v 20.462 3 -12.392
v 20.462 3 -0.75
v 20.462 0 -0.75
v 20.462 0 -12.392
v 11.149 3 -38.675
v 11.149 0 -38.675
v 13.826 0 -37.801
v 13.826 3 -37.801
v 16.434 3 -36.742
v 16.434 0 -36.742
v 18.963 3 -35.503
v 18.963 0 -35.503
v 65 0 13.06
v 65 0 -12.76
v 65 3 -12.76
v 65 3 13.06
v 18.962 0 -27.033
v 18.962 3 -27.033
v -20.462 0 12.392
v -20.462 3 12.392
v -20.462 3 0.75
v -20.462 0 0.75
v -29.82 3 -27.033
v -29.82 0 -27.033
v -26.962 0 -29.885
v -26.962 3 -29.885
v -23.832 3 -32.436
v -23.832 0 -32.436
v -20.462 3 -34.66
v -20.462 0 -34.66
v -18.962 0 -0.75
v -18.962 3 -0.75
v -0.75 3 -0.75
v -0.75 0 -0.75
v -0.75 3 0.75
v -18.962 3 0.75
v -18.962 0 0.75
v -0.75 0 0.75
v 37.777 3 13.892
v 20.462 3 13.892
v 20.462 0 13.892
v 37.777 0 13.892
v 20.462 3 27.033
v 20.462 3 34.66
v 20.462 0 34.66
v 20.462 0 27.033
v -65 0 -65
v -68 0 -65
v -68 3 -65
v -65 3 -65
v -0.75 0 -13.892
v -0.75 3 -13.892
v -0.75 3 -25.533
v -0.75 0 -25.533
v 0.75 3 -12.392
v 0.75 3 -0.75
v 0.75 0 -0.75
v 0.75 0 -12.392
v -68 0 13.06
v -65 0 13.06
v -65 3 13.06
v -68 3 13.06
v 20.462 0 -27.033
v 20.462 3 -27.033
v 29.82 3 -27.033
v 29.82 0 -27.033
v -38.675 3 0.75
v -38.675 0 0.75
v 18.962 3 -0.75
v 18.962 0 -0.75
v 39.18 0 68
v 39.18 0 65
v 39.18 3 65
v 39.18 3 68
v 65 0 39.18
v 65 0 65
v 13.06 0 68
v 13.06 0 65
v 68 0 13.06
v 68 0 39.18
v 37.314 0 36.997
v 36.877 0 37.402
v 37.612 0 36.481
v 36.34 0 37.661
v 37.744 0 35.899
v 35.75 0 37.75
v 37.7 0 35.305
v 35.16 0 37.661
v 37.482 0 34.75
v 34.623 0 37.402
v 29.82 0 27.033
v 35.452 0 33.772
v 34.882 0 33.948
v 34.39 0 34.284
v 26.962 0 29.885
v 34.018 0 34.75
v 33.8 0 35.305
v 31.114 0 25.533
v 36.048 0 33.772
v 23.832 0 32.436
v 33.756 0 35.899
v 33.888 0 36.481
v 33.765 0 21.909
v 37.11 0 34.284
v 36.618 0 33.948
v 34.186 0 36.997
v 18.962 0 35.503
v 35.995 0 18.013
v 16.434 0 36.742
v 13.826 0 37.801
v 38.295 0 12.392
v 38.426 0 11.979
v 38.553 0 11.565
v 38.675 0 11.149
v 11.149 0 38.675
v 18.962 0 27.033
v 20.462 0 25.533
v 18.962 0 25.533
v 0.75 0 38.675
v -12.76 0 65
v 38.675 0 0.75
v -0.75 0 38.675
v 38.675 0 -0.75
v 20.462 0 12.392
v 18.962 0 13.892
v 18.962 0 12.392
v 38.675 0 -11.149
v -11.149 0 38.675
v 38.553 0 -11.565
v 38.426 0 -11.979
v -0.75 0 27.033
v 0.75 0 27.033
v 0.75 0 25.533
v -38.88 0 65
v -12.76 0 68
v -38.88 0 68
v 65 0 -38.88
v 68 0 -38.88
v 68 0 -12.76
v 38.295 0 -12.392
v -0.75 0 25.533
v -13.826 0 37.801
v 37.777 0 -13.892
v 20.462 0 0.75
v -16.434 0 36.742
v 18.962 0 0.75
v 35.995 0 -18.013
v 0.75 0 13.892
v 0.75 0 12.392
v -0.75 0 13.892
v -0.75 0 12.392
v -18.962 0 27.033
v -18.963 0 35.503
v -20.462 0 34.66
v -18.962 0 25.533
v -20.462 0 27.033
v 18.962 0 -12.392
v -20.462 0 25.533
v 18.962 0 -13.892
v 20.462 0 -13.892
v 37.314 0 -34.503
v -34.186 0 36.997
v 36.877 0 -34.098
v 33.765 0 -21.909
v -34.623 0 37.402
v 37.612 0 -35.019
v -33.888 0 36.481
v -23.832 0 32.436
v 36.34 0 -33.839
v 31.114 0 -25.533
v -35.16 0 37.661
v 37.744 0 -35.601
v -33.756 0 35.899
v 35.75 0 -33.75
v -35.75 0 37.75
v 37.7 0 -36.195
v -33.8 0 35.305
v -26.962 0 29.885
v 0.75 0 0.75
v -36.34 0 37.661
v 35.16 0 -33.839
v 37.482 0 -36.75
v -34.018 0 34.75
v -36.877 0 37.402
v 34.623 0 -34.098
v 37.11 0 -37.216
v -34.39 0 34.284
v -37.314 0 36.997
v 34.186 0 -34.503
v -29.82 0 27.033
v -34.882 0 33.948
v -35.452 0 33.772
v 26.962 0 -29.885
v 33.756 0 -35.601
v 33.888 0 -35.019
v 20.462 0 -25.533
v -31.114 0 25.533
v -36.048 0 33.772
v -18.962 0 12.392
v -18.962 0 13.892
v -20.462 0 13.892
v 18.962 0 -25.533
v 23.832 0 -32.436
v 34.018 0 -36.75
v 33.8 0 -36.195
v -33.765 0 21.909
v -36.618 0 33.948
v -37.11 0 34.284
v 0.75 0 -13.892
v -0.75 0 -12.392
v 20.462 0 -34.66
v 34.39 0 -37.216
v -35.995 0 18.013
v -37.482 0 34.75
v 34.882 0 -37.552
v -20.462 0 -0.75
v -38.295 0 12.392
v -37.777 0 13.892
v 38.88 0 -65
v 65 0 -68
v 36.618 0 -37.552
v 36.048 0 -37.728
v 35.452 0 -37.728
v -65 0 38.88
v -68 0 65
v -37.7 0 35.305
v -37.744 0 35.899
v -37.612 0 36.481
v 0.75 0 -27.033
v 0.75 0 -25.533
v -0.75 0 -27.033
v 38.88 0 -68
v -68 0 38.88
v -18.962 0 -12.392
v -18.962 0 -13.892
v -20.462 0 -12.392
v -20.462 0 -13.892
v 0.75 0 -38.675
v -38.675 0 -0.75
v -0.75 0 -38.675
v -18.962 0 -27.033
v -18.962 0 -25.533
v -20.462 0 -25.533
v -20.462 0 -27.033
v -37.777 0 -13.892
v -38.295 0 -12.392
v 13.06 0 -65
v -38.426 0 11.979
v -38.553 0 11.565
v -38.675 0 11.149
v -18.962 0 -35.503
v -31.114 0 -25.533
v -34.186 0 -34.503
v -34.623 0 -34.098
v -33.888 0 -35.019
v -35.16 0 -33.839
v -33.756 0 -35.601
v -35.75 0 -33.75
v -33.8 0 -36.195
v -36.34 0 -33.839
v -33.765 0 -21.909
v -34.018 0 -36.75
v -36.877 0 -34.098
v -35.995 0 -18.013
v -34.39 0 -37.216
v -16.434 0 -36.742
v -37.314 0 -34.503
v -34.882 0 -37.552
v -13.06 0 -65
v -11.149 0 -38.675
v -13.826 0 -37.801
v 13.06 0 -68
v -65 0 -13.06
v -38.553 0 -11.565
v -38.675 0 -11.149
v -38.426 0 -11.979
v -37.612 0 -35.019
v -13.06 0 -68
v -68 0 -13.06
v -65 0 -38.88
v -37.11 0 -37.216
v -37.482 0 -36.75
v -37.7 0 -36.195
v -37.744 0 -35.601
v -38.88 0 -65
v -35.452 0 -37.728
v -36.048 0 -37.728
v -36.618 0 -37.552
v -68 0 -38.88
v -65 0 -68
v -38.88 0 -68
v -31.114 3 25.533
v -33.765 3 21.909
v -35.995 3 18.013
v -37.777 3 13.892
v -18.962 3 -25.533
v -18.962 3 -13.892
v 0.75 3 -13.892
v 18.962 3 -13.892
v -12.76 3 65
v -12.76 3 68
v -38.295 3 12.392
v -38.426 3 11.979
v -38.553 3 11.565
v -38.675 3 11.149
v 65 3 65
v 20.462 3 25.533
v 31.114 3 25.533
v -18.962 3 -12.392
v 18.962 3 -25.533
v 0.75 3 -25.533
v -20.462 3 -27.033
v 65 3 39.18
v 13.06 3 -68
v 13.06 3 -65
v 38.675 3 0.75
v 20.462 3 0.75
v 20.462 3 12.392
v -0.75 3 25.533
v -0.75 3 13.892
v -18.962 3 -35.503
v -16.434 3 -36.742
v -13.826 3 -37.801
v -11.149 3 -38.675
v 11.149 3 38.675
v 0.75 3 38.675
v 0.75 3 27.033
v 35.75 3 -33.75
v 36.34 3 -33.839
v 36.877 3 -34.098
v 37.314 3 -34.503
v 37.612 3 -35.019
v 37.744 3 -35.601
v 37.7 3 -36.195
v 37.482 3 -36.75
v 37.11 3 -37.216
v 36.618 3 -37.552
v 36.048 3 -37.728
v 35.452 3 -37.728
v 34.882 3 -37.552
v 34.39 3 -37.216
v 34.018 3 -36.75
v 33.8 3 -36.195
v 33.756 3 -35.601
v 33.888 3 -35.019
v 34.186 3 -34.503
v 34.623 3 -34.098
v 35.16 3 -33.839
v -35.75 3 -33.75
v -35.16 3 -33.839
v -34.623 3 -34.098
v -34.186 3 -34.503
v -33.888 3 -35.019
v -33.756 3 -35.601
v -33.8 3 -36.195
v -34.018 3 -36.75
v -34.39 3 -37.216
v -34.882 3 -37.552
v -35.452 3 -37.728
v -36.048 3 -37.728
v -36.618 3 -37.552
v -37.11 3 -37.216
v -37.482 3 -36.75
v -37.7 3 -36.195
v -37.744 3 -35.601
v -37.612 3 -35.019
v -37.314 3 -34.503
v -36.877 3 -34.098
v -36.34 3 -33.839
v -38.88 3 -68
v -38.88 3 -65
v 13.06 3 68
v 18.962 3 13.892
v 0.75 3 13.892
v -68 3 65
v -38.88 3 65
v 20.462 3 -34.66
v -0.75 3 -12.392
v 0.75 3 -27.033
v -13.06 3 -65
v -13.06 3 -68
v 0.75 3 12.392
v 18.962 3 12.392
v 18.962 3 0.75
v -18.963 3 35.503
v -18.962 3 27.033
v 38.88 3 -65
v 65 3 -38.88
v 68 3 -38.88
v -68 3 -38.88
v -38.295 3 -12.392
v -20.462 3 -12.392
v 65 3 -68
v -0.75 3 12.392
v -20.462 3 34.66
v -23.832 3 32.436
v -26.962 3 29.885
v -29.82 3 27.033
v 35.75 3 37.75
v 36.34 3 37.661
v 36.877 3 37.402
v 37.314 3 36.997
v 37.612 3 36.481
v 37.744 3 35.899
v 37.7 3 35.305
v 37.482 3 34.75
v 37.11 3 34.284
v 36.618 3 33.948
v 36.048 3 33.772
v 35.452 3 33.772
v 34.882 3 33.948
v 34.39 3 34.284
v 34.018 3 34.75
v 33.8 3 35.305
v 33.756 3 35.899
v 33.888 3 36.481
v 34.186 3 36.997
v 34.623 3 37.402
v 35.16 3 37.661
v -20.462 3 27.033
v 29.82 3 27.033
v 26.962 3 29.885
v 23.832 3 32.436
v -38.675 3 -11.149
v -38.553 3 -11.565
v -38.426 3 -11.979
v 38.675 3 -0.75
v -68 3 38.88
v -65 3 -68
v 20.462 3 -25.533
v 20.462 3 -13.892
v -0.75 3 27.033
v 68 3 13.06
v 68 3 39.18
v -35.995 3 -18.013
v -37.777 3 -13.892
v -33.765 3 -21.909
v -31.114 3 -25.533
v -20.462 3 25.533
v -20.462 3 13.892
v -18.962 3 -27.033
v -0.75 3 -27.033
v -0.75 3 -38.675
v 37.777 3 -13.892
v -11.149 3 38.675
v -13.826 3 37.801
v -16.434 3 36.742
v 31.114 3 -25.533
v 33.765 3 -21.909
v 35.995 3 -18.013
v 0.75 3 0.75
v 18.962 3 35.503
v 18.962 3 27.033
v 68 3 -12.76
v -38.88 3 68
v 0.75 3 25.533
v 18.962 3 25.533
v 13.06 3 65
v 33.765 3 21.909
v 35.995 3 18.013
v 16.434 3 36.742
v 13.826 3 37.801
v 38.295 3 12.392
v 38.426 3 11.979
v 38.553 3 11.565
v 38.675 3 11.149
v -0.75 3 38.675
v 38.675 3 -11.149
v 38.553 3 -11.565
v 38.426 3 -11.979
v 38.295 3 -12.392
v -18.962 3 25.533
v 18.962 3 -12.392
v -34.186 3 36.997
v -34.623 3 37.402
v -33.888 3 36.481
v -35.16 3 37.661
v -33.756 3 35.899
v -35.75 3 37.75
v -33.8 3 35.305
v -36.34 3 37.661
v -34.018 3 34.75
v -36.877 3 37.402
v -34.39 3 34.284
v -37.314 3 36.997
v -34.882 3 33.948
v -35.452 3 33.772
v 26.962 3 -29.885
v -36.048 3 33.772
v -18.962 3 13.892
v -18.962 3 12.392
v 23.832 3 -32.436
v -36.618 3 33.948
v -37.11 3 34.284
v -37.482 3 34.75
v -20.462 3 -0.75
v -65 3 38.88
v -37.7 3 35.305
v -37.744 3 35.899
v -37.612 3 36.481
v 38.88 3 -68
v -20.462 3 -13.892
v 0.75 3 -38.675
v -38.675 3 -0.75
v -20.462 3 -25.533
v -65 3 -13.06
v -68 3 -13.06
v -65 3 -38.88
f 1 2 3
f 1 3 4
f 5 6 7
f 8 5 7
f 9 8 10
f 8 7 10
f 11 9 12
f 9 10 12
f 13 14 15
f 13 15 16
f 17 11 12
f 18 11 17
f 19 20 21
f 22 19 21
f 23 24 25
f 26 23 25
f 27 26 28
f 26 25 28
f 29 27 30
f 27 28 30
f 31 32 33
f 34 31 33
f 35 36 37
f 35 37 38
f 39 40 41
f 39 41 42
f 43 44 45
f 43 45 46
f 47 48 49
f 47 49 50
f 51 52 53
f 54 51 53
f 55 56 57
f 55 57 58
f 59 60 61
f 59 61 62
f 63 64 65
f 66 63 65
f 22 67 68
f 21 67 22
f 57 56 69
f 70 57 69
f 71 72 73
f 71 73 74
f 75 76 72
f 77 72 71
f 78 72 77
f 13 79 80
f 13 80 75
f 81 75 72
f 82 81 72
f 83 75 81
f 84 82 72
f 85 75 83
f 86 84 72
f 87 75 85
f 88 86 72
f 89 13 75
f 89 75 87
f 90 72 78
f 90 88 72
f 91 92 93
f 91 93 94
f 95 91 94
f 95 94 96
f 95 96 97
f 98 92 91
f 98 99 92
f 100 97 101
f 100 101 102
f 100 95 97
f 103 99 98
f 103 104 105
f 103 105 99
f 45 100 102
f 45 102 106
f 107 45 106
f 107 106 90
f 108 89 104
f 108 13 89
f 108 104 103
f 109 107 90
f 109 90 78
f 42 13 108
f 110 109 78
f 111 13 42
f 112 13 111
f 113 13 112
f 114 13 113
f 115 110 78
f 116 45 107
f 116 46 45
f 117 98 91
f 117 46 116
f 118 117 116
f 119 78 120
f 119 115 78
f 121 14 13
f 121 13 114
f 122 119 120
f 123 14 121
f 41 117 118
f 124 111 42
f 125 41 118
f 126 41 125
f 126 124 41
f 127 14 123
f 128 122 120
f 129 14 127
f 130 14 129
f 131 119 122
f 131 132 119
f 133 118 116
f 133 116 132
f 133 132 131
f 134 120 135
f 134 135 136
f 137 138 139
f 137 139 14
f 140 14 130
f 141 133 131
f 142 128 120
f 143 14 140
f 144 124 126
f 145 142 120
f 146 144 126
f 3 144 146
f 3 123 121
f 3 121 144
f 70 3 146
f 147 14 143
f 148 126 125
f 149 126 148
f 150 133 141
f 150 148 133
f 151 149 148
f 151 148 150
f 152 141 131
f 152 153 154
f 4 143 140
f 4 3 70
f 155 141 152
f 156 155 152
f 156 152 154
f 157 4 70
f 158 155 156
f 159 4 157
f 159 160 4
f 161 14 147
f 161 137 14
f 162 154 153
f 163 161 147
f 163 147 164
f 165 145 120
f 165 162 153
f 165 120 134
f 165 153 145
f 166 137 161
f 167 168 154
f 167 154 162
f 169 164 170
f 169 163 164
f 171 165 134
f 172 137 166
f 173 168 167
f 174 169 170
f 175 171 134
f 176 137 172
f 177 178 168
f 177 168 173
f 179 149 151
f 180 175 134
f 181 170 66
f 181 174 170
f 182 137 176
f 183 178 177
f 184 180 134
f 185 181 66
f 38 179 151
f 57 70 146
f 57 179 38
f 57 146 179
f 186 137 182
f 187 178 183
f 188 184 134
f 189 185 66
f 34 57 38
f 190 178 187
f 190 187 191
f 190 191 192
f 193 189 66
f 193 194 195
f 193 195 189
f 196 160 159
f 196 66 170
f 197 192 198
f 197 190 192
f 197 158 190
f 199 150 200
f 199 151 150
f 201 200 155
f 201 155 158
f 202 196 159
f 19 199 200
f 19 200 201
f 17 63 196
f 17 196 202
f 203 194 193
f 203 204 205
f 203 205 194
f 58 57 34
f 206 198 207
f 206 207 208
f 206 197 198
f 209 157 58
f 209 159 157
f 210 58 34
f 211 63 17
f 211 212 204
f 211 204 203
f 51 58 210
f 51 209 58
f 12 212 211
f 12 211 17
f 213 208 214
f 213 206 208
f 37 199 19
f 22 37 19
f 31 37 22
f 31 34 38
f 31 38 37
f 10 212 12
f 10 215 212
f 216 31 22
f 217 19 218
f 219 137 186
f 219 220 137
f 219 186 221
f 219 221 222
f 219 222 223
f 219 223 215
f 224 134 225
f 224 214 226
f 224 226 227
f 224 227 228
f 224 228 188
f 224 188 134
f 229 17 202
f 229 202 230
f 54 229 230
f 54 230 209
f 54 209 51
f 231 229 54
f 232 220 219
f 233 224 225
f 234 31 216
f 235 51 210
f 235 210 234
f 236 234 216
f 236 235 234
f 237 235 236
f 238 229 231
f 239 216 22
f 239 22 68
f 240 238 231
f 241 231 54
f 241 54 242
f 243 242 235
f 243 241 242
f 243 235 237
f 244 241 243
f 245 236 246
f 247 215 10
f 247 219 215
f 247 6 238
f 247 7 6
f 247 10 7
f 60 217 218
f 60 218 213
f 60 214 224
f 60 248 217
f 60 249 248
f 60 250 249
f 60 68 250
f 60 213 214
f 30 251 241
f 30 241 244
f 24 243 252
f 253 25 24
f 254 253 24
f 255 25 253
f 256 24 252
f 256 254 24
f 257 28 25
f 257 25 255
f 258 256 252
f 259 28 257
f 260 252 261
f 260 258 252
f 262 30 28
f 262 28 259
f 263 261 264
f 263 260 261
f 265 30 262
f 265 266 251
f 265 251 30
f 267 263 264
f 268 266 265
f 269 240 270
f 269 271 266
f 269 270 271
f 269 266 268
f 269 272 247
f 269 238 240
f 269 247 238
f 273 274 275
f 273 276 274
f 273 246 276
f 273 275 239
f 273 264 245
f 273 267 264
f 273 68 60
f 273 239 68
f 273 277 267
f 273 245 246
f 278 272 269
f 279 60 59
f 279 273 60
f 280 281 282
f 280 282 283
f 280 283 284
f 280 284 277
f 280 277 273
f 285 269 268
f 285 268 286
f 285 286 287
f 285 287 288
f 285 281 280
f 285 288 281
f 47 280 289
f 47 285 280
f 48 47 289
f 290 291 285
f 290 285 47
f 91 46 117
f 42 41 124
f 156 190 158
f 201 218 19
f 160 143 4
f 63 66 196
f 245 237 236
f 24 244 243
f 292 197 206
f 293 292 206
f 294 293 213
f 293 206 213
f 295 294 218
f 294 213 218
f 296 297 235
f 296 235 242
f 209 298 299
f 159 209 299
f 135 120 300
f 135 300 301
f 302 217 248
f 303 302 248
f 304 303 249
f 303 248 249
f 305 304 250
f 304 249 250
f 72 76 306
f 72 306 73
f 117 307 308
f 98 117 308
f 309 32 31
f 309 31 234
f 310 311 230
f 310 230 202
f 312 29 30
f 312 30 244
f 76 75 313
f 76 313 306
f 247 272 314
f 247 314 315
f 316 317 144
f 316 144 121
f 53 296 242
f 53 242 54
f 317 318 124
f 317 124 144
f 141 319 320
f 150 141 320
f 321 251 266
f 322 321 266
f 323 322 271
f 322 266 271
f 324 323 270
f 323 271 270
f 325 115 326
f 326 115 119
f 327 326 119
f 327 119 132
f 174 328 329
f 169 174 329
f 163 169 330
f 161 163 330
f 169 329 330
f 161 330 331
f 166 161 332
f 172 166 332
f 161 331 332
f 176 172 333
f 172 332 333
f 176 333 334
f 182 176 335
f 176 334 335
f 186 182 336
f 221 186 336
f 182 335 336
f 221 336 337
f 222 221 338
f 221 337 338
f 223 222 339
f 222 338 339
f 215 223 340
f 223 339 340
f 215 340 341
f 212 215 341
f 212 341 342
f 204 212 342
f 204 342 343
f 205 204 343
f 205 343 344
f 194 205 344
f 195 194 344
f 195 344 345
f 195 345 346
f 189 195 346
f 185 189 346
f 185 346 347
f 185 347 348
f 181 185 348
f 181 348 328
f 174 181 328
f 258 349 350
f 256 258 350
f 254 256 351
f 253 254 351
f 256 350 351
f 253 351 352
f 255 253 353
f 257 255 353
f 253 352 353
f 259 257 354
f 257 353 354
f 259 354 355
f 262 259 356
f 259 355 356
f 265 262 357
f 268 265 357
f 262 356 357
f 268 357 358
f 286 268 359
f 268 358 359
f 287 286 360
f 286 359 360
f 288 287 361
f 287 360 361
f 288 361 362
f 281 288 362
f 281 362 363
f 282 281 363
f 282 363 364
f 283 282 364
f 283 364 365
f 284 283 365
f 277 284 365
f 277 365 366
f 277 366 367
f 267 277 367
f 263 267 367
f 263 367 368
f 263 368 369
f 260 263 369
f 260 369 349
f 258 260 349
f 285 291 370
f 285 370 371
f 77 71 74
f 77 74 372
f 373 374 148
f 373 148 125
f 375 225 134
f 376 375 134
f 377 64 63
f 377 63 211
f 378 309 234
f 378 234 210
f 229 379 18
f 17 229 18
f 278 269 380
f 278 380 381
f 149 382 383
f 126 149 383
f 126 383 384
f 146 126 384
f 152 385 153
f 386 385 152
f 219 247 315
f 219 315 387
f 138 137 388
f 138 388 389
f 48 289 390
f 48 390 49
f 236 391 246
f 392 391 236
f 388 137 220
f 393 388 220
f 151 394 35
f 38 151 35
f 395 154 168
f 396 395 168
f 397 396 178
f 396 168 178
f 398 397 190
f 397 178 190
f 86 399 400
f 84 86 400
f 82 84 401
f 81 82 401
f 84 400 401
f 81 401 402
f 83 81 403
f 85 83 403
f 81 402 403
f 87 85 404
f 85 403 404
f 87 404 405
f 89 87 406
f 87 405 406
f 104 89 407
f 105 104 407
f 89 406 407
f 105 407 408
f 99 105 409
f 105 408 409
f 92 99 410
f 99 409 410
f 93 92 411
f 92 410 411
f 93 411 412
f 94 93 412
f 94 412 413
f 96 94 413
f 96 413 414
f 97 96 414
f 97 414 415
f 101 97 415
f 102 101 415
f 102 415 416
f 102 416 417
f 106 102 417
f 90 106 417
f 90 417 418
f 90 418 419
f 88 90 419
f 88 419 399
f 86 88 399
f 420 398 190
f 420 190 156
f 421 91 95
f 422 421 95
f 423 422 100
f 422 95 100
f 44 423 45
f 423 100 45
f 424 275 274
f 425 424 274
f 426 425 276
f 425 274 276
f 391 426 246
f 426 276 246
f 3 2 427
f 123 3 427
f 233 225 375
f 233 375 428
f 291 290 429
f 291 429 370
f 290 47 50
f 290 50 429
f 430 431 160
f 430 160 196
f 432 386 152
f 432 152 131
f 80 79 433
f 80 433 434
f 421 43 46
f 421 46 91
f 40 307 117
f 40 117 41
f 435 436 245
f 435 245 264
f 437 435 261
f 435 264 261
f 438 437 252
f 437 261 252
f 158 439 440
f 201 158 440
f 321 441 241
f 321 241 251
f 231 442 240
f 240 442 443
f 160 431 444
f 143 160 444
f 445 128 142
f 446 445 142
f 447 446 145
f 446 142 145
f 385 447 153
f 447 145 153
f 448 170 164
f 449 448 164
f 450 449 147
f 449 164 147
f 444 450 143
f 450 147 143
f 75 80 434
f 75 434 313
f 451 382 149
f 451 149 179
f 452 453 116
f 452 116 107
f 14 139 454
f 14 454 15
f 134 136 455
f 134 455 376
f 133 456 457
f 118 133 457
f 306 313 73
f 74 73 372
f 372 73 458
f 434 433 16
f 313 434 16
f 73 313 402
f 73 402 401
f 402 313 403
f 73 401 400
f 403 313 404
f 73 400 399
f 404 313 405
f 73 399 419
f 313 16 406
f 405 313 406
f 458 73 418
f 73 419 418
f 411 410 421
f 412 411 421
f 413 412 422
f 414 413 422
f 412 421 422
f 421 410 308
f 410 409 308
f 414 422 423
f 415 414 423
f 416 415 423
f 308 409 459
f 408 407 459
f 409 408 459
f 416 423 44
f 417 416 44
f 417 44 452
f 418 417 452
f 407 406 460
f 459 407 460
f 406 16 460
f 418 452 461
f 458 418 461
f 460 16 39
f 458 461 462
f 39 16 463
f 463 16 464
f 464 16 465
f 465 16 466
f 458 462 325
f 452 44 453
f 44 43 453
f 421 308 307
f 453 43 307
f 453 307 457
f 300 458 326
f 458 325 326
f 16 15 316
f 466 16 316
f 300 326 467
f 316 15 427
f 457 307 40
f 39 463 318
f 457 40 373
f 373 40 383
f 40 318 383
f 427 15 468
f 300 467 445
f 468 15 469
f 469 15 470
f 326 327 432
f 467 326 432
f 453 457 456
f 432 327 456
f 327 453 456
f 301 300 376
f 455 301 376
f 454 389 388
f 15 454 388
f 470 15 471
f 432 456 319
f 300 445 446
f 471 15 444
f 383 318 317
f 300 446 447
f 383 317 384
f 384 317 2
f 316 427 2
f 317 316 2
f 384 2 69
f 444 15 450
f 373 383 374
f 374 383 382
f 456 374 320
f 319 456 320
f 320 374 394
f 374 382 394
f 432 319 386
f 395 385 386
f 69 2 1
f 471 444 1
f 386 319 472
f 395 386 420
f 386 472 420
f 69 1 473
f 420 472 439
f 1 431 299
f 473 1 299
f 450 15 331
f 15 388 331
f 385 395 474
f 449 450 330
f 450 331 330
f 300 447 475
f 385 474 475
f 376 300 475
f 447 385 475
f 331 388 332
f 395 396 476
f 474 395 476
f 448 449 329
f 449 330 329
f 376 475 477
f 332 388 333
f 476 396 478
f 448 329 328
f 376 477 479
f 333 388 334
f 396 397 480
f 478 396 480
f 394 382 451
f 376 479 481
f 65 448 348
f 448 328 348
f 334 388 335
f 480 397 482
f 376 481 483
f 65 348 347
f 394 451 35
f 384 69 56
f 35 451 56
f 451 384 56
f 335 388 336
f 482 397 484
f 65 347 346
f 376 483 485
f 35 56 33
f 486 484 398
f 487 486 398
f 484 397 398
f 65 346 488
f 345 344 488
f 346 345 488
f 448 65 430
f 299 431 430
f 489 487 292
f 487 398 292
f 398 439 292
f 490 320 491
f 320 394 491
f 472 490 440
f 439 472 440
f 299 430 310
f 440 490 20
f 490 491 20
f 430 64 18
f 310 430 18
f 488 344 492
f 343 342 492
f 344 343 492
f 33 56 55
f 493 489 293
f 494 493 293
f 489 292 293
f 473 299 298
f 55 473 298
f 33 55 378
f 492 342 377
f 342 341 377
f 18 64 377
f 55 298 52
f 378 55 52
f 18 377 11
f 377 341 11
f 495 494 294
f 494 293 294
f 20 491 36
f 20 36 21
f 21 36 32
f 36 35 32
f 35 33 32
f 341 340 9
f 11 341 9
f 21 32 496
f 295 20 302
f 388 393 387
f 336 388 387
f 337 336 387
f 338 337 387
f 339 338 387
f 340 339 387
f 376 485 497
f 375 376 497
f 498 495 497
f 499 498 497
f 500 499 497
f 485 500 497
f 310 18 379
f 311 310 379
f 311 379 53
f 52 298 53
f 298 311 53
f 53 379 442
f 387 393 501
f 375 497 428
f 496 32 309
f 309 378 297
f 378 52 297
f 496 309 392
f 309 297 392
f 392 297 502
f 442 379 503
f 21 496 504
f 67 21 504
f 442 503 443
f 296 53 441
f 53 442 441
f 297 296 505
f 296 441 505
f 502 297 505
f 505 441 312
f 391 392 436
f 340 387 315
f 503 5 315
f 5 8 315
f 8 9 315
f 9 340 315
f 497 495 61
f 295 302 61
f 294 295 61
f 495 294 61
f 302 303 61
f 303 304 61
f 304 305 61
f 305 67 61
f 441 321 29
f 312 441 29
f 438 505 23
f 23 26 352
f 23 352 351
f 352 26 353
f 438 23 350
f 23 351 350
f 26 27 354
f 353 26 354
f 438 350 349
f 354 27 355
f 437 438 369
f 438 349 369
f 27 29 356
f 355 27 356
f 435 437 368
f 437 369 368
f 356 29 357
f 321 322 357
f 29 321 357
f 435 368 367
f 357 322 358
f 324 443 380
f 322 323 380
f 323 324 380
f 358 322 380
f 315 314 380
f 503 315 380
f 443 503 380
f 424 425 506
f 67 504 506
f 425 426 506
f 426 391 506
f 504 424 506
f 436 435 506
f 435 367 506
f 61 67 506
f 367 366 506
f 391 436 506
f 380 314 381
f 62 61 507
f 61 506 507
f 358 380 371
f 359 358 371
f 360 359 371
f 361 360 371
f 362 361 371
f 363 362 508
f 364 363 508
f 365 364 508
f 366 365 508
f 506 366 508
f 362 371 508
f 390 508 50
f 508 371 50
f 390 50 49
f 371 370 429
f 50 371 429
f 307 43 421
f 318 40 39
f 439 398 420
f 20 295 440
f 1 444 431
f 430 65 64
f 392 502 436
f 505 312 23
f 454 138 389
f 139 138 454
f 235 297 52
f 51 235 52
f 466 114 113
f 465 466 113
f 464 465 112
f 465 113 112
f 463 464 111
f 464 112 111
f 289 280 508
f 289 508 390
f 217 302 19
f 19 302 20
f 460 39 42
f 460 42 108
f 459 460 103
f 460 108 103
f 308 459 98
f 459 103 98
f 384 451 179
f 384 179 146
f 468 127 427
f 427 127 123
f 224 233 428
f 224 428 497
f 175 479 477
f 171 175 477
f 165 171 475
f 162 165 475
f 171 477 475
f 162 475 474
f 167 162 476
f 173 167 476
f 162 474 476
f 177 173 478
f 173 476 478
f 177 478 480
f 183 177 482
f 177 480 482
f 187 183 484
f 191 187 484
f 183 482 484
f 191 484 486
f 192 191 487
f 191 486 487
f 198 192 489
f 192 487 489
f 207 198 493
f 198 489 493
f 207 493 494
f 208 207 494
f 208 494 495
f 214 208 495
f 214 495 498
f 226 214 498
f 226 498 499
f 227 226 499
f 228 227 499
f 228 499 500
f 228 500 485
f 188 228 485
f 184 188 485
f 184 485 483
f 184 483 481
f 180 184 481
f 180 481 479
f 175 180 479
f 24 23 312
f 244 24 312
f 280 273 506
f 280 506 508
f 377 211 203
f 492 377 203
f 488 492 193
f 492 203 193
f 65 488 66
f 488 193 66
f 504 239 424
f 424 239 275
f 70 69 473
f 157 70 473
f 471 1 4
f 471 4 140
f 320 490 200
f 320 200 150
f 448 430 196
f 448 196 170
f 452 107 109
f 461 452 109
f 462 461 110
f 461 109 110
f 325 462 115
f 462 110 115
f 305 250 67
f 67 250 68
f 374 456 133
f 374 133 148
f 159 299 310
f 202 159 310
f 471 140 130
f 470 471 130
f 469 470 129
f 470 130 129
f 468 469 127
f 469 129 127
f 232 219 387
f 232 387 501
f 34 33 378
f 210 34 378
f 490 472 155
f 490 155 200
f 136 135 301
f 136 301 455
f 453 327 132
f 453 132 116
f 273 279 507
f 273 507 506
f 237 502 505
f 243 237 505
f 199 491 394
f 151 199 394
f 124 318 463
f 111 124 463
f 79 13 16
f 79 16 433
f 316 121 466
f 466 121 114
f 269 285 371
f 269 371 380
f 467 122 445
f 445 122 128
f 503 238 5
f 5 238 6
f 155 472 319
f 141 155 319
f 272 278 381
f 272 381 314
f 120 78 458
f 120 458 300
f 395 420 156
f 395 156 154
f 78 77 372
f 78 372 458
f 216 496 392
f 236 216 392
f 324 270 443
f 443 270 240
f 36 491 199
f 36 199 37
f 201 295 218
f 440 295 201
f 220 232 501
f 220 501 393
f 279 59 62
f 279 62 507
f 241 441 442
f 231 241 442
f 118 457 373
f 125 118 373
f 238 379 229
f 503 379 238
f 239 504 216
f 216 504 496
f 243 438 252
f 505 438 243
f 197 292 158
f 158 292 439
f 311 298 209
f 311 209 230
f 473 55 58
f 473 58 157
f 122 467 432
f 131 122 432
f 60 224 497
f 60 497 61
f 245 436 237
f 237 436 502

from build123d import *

# Parameters (mm, degrees)
BOSS_EXTRUDE1_DEPTH = 3
SKETCH2_W           = 130
SKETCH2_H           = 1.5
BOSS_EXTRUDE2_DEPTH = 3
SKETCH3_W           = 1.5
SKETCH3_H           = 11.641666667
SKETCH3_H_2         = 11.641666666
BOSS_EXTRUDE3_DEPTH = 3
SKETCH4_R           = 2
CUT_EXTRUDE1_DEPTH  = 97.213304693


with BuildPart() as part:
    # Sketch1 → Boss-Extrude1 (new body)
    with BuildSketch(Plane(origin=(0, 0, 0), x_dir=(1, 0, 0), z_dir=(0, 1, 0))):
        Polygon((65, 38.88), (68, 38.88), (68, 12.76), (65, 12.76), (65, -13.06), (68, -13.06), (68, -39.18), (65, -39.18), (65, -65), (39.18, -65), (39.18, -68), (13.06, -68), (13.06, -65), (-12.76, -65), (-12.76, -68), (-38.88, -68), (-38.88, -65), (-64.7, -65), (-68, -65), (-68, -38.88), (-65, -38.88), (-65, -13.06), (-68, -13.06), (-68, 13.06), (-65, 13.06), (-65, 38.88), (-68, 38.88), (-68, 65), (-65, 65), (-65, 68), (-38.88, 68), (-38.88, 65), (-13.06, 65), (-13.06, 68), (13.06, 68), (13.06, 65), (38.88, 65), (38.88, 68), (65, 68), (65, 64.7), align=None)
        with BuildLine():
            Line((11.149299305, -38.675), (-11.149299305, -38.675))
            ThreePointArc((-11.149299305, -38.675), (-28.461047943, -28.461047943), (-38.675, -11.149299305))
            Line((-38.675, -11.149299305), (-38.675, 11.149299305))
            ThreePointArc((-38.675, 11.149299305), (-28.461047943, 28.461047943), (-11.149299305, 38.675))
            Line((-11.149299305, 38.675), (11.149299305, 38.675))
            ThreePointArc((11.149299305, 38.675), (28.461047943, 28.461047943), (38.675, 11.149299305))
            Line((38.675, 11.149299305), (38.675, -11.149299305))
            ThreePointArc((38.675, -11.149299305), (28.461047943, -28.461047943), (11.149299305, -38.675))
        make_face(mode=Mode.SUBTRACT)
    extrude(amount=BOSS_EXTRUDE1_DEPTH)

    # Sketch2 → Boss-Extrude2 (add, through all)
    with BuildSketch(Plane(origin=(0, 3, 0), x_dir=(1, 0, 0), z_dir=(0, 1, 0))):
        with Locations((0, 39.425)):
            Rectangle(SKETCH2_W, SKETCH2_H)
        with Locations((0, 26.283333333)):
            Rectangle(SKETCH2_W, SKETCH2_H)
        with Locations((0, 13.141666667)):
            Rectangle(SKETCH2_W, SKETCH2_H)
        Rectangle(SKETCH2_W, SKETCH2_H)
        with Locations((0, -13.141666667)):
            Rectangle(SKETCH2_W, SKETCH2_H)
        with Locations((0, -26.283333333)):
            Rectangle(SKETCH2_W, SKETCH2_H)
        with Locations((0, -39.425)):
            Rectangle(SKETCH2_W, SKETCH2_H)
    extrude(amount=-BOSS_EXTRUDE2_DEPTH)

    # Sketch3 → Boss-Extrude3 (add, through all)
    with BuildSketch(Plane(origin=(0, 3, 0), x_dir=(1, 0, 0), z_dir=(0, 1, 0))):
        with Locations((-19.7125, -6.570833334)):
            Rectangle(SKETCH3_W, SKETCH3_H)
        with Locations((-19.7125, 6.570833334)):
            Rectangle(SKETCH3_W, SKETCH3_H)
        with Locations((-19.7125, -19.7125)):
            Rectangle(SKETCH3_W, SKETCH3_H_2)
        with Locations((0, -6.570833334)):
            Rectangle(SKETCH3_W, SKETCH3_H)
        with Locations((-19.7125, 19.7125)):
            Rectangle(SKETCH3_W, SKETCH3_H_2)
        with Locations((0, 6.570833334)):
            Rectangle(SKETCH3_W, SKETCH3_H)
        with BuildLine():
            Line((-18.9625, -27.033333333), (-20.4625, -27.033333333))
            Line((-20.4625, -27.033333333), (-20.4625, -34.66047596))
            ThreePointArc((-20.4625, -34.66047596), (-19.717004208, -35.089916573), (-18.9625, -35.503325108))
            Line((-18.9625, -35.503325108), (-18.9625, -27.033333333))
        make_face()
        with Locations((0, -19.7125)):
            Rectangle(SKETCH3_W, SKETCH3_H_2)
        with Locations((19.7125, -6.570833334)):
            Rectangle(SKETCH3_W, SKETCH3_H)
        with BuildLine():
            Line((-20.4625, 34.66047596), (-20.4625, 27.033333333))
            Line((-20.4625, 27.033333333), (-18.9625, 27.033333333))
            Line((-18.9625, 27.033333333), (-18.9625, 35.503325108))
            ThreePointArc((-18.9625, 35.503325108), (-19.717004208, 35.089916573), (-20.4625, 34.66047596))
        make_face()
        with Locations((0, 19.7125)):
            Rectangle(SKETCH3_W, SKETCH3_H_2)
        with Locations((19.7125, 6.570833334)):
            Rectangle(SKETCH3_W, SKETCH3_H)
        with Locations((0, -32.854166667)):
            Rectangle(SKETCH3_W, SKETCH3_H)
        with Locations((19.7125, -19.7125)):
            Rectangle(SKETCH3_W, SKETCH3_H_2)
        with Locations((0, 32.854166667)):
            Rectangle(SKETCH3_W, SKETCH3_H)
        with Locations((19.7125, 19.7125)):
            Rectangle(SKETCH3_W, SKETCH3_H_2)
        with BuildLine():
            Line((20.4625, -27.033333333), (18.9625, -27.033333333))
            Line((18.9625, -27.033333333), (18.9625, -35.503325108))
            ThreePointArc((18.9625, -35.503325108), (19.717004208, -35.089916573), (20.4625, -34.66047596))
            Line((20.4625, -34.66047596), (20.4625, -27.033333333))
        make_face()
        with BuildLine():
            Line((18.9625, 35.503325108), (18.9625, 27.033333333))
            Line((18.9625, 27.033333333), (20.4625, 27.033333333))
            Line((20.4625, 27.033333333), (20.4625, 34.66047596))
            ThreePointArc((20.4625, 34.66047596), (19.717004208, 35.089916573), (18.9625, 35.503325108))
        make_face()
    extrude(amount=-BOSS_EXTRUDE3_DEPTH)

    # Sketch4 → Cut-Extrude1 (cut, through all)
    with BuildSketch(Plane(origin=(0, 3, 0), x_dir=(1, 0, 0), z_dir=(0, 1, 0))):
        with Locations(Location((-35.75, 35.75, 0), (0, 0, 270))):
            Circle(SKETCH4_R)
        with Locations(Location((35.75, 35.75, 0), (0, 0, 270))):
            Circle(SKETCH4_R)
        with Locations(Location((35.75, -35.75, 0), (0, 0, 270))):
            Circle(SKETCH4_R)
        with Locations(Location((-35.75, -35.75, 0), (0, 0, 270))):
            Circle(SKETCH4_R)
    extrude(amount=-CUT_EXTRUDE1_DEPTH, mode=Mode.SUBTRACT)


solid = part.part
